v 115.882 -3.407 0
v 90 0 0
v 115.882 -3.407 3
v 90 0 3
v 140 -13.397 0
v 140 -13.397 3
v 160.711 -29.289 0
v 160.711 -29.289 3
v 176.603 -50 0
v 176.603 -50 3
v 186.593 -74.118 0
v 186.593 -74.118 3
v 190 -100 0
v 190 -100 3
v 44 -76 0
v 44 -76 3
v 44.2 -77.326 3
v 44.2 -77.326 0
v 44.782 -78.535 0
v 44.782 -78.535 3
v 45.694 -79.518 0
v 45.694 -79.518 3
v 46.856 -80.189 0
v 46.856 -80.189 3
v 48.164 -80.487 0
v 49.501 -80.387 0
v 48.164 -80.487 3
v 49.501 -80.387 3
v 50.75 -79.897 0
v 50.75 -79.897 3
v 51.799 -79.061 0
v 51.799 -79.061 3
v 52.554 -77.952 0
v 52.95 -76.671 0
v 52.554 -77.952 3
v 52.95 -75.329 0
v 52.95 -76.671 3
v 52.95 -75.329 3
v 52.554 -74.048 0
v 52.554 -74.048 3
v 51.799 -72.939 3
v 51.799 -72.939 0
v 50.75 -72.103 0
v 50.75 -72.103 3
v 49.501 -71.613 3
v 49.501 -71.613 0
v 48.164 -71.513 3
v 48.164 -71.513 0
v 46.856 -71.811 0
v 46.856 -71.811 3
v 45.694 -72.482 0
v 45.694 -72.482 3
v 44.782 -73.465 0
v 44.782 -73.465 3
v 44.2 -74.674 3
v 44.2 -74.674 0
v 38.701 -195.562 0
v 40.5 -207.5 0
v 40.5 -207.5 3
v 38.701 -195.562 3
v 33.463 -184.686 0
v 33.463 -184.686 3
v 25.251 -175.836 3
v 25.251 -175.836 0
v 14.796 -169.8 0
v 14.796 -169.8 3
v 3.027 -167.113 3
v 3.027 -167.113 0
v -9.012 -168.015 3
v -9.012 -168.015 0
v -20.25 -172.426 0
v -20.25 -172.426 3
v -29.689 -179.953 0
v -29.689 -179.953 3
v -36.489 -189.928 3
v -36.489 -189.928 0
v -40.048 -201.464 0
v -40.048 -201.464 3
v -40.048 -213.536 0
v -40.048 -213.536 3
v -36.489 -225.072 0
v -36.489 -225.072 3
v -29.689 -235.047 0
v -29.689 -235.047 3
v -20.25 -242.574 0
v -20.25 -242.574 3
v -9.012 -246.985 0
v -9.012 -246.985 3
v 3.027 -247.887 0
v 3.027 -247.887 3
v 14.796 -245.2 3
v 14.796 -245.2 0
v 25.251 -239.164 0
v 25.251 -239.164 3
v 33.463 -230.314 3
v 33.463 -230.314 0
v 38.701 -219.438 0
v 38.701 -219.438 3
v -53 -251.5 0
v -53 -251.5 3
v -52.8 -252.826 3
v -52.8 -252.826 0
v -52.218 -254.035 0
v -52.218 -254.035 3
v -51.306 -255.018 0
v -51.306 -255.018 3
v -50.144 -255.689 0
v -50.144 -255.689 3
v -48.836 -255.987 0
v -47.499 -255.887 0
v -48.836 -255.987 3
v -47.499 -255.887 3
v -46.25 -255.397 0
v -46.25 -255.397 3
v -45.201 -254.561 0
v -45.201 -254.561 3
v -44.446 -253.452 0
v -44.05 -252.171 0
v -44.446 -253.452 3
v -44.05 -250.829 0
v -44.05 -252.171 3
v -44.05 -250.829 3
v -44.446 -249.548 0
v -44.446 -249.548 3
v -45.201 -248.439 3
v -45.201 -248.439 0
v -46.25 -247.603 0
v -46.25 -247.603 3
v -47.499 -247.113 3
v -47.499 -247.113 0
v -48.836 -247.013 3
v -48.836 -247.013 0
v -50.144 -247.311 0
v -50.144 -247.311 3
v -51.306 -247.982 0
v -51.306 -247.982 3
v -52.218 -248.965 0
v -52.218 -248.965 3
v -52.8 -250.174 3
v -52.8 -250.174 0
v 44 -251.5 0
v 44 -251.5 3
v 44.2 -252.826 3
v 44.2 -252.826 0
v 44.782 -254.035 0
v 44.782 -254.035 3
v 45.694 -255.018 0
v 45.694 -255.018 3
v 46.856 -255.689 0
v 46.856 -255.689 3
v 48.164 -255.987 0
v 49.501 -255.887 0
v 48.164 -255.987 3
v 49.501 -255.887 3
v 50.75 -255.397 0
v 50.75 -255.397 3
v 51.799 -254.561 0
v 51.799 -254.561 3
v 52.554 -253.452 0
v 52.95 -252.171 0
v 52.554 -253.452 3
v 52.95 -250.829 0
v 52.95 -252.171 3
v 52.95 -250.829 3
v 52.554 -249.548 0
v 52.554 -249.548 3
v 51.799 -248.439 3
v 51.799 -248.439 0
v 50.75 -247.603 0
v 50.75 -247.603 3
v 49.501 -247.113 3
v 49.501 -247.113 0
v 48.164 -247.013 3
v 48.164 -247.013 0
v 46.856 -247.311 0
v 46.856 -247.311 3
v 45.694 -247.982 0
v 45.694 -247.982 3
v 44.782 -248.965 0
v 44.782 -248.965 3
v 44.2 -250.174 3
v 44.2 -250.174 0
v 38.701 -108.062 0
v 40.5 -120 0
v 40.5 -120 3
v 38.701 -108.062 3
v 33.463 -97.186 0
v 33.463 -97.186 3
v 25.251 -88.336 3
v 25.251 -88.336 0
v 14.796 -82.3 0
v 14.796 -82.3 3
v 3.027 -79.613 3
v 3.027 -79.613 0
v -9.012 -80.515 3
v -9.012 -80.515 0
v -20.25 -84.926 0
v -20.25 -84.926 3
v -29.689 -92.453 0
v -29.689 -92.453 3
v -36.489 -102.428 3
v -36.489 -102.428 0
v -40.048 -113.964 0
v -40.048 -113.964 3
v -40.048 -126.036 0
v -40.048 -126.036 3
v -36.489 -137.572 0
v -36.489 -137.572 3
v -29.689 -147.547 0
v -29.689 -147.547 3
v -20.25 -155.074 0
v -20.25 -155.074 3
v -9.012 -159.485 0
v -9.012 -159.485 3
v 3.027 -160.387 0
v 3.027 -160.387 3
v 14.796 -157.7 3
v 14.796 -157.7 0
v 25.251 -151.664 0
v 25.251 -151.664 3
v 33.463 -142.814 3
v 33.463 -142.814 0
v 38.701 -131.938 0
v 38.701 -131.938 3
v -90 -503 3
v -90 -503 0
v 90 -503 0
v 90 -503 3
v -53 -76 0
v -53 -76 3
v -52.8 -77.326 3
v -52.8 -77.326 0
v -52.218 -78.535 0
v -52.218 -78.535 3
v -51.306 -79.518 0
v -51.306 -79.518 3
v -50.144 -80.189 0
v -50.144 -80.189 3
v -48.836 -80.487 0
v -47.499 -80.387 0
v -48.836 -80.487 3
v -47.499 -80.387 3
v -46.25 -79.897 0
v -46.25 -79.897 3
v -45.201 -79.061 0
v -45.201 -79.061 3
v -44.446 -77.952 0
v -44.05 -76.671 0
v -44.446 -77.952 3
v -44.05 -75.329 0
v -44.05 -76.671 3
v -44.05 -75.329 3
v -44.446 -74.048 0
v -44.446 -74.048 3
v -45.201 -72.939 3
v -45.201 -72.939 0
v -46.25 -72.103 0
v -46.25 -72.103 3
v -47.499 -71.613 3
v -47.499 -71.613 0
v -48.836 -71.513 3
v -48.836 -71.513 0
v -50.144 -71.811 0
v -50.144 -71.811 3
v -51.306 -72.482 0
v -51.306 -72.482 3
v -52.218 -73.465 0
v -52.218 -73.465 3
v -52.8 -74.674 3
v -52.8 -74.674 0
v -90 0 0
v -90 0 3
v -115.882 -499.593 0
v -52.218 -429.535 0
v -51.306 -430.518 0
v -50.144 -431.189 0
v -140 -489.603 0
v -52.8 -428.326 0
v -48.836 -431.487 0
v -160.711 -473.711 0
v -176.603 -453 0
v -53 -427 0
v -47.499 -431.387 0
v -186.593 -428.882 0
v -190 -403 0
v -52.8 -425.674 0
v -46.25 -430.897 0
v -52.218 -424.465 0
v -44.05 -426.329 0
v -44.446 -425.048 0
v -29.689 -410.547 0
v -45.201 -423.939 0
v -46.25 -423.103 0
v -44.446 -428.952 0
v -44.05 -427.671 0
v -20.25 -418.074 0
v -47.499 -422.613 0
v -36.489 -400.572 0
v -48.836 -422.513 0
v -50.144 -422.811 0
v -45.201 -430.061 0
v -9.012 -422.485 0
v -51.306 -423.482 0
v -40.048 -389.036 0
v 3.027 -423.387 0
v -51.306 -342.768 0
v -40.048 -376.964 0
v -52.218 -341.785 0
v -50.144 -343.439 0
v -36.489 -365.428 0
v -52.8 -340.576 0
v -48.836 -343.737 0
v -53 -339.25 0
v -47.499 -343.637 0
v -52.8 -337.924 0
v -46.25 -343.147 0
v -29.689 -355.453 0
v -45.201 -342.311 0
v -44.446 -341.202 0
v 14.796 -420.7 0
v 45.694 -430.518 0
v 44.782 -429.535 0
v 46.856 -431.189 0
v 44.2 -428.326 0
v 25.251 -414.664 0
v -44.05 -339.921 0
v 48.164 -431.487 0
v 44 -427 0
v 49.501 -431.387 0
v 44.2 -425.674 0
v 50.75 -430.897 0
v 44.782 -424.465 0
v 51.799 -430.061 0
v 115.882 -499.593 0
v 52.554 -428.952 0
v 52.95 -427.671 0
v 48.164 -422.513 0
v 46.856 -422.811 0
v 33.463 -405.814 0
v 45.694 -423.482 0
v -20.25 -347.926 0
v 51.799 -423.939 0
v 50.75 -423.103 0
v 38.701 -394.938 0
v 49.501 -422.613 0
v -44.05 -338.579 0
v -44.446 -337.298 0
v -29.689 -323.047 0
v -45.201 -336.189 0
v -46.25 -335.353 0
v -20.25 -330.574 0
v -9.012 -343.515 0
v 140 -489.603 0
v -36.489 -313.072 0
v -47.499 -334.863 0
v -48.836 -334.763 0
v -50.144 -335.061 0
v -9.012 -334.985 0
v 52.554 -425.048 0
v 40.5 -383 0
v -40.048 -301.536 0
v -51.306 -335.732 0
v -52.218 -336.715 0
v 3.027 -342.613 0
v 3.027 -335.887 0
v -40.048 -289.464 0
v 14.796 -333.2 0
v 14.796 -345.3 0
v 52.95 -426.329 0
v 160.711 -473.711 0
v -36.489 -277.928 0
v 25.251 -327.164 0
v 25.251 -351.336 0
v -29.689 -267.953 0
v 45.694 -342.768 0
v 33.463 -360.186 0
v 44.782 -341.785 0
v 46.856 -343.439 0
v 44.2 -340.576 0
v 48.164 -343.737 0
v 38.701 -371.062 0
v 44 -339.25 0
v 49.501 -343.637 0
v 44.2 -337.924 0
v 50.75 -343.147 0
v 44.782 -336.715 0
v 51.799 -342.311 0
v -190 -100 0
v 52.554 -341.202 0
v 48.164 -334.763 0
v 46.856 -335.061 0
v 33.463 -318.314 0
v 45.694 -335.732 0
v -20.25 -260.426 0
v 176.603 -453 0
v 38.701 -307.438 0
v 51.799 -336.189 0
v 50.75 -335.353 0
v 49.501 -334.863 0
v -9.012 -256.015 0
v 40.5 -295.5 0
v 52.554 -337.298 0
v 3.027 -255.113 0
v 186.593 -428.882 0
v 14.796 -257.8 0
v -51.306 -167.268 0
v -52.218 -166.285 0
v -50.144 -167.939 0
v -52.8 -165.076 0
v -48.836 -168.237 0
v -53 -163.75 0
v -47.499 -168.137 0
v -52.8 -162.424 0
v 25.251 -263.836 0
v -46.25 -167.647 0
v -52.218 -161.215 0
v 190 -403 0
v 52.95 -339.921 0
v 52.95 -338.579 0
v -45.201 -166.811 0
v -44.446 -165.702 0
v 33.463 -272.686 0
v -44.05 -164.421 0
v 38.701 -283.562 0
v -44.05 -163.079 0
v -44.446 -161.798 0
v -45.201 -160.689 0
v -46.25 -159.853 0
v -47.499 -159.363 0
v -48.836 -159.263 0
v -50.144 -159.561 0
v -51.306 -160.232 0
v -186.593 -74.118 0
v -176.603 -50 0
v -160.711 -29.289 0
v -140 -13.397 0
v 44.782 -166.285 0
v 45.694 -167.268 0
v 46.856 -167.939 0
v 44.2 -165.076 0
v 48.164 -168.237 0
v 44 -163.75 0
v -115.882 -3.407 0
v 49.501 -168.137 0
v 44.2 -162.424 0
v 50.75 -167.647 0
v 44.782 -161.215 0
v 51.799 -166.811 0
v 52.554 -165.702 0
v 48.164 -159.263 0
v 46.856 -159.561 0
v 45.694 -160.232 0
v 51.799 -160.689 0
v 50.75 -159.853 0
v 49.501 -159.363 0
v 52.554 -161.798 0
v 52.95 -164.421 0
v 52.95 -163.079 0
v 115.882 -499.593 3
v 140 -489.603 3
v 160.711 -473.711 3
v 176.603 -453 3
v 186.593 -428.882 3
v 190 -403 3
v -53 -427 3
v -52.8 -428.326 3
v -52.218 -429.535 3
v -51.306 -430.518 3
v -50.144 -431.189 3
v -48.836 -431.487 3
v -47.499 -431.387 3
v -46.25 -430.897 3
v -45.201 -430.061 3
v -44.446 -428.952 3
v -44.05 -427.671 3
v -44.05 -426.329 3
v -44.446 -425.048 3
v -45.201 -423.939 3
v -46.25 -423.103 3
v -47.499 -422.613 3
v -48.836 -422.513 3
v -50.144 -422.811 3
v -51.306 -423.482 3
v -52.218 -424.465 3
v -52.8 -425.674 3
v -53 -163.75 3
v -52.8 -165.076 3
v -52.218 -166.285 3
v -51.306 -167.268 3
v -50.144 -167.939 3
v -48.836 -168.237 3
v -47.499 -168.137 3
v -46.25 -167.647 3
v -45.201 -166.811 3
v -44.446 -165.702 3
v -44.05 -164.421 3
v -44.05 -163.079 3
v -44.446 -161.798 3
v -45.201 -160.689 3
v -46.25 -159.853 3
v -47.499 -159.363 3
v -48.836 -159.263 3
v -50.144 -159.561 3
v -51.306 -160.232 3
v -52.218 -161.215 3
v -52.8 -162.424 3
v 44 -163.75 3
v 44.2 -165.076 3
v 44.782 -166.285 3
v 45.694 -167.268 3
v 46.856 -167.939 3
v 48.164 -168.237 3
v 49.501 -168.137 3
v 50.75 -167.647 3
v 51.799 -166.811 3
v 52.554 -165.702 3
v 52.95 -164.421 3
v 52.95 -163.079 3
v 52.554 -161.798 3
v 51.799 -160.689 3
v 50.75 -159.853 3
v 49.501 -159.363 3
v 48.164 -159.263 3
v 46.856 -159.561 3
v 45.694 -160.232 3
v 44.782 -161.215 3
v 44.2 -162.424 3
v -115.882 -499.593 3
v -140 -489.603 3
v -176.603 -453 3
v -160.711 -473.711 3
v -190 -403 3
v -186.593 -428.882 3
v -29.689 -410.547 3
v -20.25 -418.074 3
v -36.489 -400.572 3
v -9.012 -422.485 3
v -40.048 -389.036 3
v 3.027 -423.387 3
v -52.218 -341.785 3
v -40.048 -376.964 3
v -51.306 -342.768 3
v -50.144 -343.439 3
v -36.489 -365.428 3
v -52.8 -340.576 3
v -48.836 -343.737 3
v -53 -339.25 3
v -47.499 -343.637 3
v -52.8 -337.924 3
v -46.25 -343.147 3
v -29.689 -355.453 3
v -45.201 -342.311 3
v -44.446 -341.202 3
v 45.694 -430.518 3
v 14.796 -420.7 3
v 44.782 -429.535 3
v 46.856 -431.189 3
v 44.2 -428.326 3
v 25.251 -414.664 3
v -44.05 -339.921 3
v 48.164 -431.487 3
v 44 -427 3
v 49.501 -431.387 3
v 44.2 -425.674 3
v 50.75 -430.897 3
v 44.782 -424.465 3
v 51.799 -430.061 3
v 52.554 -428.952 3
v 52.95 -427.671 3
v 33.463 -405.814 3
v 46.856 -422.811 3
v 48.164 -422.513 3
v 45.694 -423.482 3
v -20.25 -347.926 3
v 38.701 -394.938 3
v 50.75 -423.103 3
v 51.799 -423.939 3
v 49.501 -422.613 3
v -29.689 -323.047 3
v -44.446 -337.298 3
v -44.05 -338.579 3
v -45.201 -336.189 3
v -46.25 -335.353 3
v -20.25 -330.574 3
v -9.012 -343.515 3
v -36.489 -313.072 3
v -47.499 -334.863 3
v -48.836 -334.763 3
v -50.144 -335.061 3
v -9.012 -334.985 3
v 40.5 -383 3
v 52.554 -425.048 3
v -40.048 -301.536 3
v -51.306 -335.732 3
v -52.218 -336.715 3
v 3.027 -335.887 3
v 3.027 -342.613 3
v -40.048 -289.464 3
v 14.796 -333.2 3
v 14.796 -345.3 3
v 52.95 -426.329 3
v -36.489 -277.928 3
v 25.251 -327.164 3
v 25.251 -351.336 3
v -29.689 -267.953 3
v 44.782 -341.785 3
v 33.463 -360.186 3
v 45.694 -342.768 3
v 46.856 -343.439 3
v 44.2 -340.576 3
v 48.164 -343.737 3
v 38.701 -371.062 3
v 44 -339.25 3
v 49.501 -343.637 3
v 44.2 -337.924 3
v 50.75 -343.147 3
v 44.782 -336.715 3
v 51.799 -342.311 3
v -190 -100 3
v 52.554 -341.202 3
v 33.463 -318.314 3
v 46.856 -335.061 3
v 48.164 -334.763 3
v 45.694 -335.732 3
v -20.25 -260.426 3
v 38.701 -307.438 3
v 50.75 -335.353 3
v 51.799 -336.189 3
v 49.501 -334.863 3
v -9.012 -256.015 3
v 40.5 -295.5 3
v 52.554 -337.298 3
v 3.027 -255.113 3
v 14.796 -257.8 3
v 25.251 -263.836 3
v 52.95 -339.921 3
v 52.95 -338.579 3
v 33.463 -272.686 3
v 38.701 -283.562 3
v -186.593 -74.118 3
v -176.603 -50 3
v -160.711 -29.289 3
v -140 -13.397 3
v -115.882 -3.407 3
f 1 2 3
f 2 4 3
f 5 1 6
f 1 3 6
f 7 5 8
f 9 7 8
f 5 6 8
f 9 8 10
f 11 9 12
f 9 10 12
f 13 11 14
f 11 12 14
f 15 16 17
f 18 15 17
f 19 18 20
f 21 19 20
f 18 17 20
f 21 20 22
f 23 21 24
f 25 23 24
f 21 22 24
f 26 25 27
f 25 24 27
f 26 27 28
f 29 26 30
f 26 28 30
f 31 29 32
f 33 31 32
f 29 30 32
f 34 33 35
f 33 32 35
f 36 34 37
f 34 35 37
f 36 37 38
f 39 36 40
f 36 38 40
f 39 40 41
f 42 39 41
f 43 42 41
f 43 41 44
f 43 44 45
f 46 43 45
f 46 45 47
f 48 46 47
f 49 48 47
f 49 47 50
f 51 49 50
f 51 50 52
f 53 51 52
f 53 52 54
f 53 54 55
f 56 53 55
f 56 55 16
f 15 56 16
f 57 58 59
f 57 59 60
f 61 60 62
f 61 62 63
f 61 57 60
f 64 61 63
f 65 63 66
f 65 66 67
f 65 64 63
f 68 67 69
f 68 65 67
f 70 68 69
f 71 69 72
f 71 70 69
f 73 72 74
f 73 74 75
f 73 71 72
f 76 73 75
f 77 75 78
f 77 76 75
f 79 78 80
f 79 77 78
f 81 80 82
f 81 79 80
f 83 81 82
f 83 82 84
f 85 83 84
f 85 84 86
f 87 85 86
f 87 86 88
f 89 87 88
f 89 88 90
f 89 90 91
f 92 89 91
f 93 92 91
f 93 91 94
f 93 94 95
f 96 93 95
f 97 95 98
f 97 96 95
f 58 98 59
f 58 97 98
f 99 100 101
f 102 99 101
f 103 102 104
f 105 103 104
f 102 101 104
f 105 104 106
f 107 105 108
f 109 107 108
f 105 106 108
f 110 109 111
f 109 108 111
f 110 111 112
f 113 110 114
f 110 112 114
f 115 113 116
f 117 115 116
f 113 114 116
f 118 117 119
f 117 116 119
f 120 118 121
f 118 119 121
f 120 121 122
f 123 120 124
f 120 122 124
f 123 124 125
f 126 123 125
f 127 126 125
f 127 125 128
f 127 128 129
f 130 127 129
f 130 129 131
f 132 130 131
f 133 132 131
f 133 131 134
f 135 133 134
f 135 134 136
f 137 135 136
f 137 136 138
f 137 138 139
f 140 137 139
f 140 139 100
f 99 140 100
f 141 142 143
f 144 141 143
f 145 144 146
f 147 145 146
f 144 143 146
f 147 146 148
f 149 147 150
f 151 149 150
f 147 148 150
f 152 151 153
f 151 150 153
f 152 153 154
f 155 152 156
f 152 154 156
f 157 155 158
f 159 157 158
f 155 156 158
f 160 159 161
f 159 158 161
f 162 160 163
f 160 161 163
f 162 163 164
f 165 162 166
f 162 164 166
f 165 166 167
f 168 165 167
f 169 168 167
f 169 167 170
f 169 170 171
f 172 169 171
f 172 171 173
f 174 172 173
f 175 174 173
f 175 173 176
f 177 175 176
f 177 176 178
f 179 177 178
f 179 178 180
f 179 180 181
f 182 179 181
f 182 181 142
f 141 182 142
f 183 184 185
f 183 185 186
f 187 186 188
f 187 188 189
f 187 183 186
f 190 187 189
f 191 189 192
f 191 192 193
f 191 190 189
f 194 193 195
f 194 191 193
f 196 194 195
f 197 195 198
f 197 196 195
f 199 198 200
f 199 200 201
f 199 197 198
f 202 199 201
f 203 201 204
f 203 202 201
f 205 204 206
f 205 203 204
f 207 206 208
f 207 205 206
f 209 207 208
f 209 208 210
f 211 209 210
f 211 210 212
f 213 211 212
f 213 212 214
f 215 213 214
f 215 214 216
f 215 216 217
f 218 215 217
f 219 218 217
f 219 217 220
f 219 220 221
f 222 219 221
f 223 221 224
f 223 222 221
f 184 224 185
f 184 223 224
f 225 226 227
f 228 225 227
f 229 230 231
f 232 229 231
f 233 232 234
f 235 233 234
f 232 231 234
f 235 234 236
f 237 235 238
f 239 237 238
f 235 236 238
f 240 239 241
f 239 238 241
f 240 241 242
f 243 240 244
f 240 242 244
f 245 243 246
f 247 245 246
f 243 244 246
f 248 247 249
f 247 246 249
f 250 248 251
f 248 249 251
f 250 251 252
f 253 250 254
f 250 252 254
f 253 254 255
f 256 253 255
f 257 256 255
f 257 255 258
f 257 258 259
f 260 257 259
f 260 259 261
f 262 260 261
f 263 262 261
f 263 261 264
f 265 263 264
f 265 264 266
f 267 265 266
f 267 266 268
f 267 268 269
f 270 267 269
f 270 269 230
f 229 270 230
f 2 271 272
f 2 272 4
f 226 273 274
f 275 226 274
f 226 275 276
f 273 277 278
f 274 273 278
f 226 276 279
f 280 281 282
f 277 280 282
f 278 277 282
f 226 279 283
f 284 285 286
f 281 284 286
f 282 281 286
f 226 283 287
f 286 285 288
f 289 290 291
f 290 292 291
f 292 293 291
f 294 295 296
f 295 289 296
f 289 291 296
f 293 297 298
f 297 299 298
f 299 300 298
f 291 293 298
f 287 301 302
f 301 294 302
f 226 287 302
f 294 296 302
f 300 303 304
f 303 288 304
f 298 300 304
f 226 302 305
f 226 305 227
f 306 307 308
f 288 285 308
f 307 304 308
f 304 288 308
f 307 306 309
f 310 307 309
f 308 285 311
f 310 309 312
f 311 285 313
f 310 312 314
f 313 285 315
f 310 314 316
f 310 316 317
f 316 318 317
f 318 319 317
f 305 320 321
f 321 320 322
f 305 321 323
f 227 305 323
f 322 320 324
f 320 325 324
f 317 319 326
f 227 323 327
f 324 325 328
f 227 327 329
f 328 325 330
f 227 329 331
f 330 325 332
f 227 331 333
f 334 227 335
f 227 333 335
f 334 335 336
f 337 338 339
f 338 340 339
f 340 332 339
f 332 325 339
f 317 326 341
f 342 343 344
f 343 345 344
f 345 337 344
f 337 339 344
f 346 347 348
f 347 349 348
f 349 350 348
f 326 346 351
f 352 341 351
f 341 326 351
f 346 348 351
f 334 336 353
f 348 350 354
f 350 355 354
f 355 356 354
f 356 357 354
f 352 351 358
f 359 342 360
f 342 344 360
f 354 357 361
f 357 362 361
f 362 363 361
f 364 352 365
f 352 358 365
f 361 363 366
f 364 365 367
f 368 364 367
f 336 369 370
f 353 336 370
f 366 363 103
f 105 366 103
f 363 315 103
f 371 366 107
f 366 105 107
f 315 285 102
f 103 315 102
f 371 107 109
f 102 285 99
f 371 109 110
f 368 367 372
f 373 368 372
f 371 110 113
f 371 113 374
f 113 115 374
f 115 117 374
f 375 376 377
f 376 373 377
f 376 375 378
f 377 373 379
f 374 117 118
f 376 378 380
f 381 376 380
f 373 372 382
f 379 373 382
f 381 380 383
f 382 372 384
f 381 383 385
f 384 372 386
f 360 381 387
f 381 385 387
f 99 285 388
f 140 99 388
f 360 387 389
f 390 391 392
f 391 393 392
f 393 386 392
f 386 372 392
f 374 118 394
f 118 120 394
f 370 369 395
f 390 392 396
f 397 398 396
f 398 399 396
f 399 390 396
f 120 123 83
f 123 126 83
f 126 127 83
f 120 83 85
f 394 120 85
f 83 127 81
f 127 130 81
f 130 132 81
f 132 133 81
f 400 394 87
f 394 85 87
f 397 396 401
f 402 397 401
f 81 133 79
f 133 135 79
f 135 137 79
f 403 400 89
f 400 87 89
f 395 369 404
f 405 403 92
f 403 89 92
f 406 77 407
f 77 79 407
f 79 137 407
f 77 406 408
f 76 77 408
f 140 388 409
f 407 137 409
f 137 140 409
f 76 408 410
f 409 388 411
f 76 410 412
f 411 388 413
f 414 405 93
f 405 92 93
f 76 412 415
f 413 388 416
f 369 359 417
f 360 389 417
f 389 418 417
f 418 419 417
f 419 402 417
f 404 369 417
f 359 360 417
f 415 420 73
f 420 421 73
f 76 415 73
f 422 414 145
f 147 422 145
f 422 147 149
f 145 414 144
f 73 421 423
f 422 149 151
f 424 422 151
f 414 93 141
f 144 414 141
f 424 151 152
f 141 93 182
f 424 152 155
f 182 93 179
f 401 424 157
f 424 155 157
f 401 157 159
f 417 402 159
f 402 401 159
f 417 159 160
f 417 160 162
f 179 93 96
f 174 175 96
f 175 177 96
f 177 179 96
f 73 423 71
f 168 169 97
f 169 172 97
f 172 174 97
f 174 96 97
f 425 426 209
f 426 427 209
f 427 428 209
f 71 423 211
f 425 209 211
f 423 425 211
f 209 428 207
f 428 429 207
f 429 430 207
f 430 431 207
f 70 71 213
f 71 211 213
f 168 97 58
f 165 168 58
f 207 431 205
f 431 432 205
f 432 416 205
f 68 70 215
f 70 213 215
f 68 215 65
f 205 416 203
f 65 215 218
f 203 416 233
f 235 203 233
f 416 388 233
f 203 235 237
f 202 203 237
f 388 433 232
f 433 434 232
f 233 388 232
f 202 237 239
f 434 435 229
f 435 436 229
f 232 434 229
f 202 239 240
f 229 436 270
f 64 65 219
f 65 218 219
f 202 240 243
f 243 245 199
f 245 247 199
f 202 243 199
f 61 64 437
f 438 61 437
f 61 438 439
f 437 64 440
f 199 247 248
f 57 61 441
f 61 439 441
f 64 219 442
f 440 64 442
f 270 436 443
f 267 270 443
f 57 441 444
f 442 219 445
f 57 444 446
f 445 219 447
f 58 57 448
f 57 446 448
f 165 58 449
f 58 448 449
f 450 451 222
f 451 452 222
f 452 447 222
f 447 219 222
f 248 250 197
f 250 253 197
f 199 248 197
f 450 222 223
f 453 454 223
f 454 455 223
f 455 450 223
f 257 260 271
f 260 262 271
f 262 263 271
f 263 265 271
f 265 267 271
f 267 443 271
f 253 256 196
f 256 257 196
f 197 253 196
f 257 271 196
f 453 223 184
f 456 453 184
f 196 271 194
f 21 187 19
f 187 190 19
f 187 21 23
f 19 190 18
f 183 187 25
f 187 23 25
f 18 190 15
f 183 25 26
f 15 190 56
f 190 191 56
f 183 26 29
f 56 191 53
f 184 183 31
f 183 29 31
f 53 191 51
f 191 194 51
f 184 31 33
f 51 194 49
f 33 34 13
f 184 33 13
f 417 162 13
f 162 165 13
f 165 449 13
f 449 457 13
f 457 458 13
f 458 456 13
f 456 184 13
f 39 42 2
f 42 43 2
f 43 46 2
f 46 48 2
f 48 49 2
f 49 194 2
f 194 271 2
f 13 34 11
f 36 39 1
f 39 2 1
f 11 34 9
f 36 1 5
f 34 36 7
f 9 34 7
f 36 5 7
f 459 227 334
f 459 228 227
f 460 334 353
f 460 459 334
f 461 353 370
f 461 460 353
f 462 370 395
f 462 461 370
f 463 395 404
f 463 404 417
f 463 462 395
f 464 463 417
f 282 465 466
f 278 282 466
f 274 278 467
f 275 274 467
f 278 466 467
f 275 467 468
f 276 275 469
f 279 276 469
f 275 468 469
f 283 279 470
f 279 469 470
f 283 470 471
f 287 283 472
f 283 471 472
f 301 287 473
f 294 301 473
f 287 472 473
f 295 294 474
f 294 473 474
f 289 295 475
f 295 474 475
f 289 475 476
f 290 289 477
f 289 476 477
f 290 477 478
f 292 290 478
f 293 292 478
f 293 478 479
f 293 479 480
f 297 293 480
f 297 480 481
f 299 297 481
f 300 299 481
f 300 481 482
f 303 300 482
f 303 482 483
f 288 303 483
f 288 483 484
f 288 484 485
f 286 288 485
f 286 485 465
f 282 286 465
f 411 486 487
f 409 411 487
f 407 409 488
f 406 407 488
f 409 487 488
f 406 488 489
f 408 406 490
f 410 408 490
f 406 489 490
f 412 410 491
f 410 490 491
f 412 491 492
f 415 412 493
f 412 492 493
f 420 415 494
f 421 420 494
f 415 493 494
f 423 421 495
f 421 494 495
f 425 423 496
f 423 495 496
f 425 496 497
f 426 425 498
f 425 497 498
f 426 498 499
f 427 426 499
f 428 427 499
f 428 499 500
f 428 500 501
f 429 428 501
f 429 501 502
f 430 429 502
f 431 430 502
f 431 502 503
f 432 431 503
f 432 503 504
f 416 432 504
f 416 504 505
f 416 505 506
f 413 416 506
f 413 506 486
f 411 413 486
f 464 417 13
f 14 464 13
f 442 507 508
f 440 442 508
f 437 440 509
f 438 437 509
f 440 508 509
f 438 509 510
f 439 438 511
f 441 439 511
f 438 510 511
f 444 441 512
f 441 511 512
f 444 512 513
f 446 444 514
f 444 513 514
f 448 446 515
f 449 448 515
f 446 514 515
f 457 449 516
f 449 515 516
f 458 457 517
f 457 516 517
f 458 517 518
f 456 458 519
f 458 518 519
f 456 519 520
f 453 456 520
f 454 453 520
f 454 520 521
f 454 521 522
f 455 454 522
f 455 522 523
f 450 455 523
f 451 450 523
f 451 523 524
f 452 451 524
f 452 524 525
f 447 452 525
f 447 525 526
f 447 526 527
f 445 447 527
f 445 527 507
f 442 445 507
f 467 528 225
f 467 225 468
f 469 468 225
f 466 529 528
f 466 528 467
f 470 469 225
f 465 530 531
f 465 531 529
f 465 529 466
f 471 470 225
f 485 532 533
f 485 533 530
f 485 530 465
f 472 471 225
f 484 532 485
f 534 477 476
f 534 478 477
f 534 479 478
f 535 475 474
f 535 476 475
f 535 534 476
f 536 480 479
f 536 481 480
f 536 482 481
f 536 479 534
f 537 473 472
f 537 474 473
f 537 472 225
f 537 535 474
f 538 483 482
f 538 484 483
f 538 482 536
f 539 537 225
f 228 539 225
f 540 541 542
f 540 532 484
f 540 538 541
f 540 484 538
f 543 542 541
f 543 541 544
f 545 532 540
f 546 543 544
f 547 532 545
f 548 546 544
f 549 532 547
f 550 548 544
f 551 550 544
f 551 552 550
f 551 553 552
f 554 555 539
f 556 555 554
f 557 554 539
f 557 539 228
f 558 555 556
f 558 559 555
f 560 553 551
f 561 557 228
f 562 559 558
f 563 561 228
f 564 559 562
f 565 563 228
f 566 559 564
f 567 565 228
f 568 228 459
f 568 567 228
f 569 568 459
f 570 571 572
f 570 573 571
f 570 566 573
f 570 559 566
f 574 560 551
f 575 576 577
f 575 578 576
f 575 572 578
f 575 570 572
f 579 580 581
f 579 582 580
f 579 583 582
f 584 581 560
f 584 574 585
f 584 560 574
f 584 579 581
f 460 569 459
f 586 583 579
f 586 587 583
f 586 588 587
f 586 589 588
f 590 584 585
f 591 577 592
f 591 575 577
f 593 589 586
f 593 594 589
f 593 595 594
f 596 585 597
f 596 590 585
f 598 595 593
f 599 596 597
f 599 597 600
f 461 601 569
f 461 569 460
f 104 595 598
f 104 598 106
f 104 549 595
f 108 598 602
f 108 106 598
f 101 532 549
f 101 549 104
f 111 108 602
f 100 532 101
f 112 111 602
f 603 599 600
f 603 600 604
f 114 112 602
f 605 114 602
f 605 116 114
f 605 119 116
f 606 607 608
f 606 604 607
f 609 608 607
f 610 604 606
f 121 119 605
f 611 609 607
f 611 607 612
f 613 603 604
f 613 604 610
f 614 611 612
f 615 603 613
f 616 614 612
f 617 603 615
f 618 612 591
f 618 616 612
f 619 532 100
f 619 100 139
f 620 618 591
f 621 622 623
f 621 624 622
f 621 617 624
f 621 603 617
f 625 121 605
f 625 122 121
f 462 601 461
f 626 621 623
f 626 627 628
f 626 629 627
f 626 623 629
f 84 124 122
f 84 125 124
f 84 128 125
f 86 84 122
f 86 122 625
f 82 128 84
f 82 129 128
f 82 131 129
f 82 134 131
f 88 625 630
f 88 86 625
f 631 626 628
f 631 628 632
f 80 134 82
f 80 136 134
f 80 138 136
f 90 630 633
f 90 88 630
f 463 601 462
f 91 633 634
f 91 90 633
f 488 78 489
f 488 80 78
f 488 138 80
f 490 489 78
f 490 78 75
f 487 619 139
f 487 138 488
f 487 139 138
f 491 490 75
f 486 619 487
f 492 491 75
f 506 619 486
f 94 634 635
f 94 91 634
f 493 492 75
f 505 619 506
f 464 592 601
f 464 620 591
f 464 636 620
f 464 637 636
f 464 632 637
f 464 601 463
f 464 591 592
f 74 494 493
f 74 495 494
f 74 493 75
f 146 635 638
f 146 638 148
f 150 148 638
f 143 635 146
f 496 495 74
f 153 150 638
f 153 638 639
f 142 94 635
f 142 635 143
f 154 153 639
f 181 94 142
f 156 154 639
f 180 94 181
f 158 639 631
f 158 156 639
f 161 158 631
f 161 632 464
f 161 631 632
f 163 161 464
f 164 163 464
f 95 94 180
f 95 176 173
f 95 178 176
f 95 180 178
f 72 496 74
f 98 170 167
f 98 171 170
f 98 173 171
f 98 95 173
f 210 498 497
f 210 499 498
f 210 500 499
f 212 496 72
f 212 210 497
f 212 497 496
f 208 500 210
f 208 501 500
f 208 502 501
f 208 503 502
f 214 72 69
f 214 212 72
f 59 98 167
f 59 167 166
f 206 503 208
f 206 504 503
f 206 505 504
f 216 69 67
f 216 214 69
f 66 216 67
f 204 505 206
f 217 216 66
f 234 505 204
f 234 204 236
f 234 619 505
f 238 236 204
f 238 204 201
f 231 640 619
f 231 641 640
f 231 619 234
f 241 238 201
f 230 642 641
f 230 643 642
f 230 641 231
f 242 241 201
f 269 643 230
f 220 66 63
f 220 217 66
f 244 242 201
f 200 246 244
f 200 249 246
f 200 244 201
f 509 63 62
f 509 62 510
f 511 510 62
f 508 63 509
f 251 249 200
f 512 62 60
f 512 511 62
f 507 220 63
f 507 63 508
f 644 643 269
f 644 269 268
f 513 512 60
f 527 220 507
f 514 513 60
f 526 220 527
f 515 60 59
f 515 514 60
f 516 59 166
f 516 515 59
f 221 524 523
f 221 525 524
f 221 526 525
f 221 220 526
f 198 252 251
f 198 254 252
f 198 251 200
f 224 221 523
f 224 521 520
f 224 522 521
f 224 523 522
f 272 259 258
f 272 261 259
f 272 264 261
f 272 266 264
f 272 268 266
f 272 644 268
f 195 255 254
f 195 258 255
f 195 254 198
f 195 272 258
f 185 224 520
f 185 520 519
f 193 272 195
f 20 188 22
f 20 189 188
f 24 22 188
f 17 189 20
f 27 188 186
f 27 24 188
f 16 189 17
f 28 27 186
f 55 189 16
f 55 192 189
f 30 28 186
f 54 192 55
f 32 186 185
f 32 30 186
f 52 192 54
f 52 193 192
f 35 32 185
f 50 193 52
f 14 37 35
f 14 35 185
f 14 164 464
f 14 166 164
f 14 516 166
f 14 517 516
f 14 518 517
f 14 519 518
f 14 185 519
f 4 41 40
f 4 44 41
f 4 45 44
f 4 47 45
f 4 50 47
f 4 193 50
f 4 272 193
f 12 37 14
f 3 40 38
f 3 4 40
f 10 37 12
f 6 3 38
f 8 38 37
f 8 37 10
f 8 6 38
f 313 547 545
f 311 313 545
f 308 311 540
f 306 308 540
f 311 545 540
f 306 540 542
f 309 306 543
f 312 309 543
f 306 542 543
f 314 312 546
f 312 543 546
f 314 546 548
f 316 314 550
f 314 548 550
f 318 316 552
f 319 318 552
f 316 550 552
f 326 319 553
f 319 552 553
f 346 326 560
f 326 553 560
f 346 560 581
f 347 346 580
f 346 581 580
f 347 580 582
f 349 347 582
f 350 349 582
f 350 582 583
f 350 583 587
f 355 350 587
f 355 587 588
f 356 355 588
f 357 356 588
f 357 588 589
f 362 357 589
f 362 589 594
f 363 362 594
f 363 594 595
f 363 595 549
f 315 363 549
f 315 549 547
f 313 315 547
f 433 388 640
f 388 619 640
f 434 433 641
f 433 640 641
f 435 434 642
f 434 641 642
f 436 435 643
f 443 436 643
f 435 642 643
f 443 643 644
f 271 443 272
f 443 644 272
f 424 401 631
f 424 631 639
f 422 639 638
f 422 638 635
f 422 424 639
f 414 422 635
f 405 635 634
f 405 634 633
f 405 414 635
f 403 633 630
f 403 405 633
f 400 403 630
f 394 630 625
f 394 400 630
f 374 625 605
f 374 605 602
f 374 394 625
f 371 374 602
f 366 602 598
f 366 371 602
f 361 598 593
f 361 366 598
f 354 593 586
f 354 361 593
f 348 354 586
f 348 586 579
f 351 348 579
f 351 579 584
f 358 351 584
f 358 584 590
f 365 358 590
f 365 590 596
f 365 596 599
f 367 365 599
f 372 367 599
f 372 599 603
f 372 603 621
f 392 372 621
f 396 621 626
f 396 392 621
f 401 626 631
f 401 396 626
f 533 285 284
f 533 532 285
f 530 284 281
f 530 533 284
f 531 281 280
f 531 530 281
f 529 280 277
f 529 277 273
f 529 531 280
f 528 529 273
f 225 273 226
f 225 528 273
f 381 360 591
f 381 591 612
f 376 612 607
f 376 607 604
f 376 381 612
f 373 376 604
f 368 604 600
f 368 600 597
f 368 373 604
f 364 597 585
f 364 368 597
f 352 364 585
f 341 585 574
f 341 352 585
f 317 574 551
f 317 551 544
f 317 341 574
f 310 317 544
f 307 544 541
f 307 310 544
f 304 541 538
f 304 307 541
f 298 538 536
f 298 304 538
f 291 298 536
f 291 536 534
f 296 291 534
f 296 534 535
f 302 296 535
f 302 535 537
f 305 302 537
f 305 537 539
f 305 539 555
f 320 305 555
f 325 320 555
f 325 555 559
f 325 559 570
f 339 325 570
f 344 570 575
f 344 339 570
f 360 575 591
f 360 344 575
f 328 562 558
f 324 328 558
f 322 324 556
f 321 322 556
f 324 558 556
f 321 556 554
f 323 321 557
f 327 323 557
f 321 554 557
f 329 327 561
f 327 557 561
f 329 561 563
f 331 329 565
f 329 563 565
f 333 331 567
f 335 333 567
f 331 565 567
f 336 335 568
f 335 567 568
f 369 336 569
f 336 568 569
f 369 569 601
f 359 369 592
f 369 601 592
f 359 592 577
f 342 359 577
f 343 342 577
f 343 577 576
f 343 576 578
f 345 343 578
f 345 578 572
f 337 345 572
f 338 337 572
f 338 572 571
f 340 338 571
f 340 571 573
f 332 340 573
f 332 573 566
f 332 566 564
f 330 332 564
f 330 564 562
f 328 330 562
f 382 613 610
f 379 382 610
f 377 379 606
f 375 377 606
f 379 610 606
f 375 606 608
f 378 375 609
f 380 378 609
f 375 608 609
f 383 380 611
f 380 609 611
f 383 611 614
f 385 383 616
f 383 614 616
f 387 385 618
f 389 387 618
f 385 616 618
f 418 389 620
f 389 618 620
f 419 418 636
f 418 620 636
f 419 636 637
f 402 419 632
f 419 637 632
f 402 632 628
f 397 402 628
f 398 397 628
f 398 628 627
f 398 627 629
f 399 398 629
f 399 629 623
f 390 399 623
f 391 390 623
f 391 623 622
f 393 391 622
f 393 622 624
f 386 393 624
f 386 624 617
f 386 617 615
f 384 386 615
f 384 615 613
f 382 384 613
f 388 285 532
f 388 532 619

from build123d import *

# Parameters (mm, degrees)
F0_W     = 380
F0_H     = 503
F0_R     = 40.5
F1_DEPTH = 3
F2_R     = 100
F3_D     = 9
F3_DEPTH = 5
F3_TIP   = 2.7038727856


with BuildPart() as f1:
    # F0 (on Top) → F1 (new body)
    with BuildSketch(Plane.XY):
        with Locations((0, -251.5)):
            Rectangle(F0_W, F0_H)
        with Locations((0, -383)):
            Circle(F0_R, mode=Mode.SUBTRACT)
        with Locations((0, -295.5)):
            Circle(F0_R, mode=Mode.SUBTRACT)
        with Locations((0, -207.5)):
            Circle(F0_R, mode=Mode.SUBTRACT)
        with Locations((0, -120)):
            Circle(F0_R, mode=Mode.SUBTRACT)
    extrude(amount=F1_DEPTH)

    # F2
    f2_edges = [f1.edges().sort_by_distance(p)[0] for p in [
        (-190, 0, 1.5),
        (190, 0, 1.5),
        (-190, -503, 1.5),
        (190, -503, 1.5),
    ]]
    fillet(f2_edges, radius=F2_R)

    # F3
    with Locations(Plane(origin=(0, 0, 0), x_dir=(1, 0, 0), z_dir=(0, 0, -1))):
        with Locations((-48.5, 76), (48.5, 76), (-48.5, 163.75), (48.5, 163.75), (-48.5, 251.5), (48.5, 251.5), (-48.5, 339.25), (48.5, 339.25), (-48.5, 427), (48.5, 427)):
            Hole(F3_D / 2, depth=F3_DEPTH)
            with Locations((0, 0, -(F3_DEPTH + F3_TIP / 2))):  # 118° drill point
                Cone(0, F3_D / 2, F3_TIP, mode=Mode.SUBTRACT)


solid = f1.part
